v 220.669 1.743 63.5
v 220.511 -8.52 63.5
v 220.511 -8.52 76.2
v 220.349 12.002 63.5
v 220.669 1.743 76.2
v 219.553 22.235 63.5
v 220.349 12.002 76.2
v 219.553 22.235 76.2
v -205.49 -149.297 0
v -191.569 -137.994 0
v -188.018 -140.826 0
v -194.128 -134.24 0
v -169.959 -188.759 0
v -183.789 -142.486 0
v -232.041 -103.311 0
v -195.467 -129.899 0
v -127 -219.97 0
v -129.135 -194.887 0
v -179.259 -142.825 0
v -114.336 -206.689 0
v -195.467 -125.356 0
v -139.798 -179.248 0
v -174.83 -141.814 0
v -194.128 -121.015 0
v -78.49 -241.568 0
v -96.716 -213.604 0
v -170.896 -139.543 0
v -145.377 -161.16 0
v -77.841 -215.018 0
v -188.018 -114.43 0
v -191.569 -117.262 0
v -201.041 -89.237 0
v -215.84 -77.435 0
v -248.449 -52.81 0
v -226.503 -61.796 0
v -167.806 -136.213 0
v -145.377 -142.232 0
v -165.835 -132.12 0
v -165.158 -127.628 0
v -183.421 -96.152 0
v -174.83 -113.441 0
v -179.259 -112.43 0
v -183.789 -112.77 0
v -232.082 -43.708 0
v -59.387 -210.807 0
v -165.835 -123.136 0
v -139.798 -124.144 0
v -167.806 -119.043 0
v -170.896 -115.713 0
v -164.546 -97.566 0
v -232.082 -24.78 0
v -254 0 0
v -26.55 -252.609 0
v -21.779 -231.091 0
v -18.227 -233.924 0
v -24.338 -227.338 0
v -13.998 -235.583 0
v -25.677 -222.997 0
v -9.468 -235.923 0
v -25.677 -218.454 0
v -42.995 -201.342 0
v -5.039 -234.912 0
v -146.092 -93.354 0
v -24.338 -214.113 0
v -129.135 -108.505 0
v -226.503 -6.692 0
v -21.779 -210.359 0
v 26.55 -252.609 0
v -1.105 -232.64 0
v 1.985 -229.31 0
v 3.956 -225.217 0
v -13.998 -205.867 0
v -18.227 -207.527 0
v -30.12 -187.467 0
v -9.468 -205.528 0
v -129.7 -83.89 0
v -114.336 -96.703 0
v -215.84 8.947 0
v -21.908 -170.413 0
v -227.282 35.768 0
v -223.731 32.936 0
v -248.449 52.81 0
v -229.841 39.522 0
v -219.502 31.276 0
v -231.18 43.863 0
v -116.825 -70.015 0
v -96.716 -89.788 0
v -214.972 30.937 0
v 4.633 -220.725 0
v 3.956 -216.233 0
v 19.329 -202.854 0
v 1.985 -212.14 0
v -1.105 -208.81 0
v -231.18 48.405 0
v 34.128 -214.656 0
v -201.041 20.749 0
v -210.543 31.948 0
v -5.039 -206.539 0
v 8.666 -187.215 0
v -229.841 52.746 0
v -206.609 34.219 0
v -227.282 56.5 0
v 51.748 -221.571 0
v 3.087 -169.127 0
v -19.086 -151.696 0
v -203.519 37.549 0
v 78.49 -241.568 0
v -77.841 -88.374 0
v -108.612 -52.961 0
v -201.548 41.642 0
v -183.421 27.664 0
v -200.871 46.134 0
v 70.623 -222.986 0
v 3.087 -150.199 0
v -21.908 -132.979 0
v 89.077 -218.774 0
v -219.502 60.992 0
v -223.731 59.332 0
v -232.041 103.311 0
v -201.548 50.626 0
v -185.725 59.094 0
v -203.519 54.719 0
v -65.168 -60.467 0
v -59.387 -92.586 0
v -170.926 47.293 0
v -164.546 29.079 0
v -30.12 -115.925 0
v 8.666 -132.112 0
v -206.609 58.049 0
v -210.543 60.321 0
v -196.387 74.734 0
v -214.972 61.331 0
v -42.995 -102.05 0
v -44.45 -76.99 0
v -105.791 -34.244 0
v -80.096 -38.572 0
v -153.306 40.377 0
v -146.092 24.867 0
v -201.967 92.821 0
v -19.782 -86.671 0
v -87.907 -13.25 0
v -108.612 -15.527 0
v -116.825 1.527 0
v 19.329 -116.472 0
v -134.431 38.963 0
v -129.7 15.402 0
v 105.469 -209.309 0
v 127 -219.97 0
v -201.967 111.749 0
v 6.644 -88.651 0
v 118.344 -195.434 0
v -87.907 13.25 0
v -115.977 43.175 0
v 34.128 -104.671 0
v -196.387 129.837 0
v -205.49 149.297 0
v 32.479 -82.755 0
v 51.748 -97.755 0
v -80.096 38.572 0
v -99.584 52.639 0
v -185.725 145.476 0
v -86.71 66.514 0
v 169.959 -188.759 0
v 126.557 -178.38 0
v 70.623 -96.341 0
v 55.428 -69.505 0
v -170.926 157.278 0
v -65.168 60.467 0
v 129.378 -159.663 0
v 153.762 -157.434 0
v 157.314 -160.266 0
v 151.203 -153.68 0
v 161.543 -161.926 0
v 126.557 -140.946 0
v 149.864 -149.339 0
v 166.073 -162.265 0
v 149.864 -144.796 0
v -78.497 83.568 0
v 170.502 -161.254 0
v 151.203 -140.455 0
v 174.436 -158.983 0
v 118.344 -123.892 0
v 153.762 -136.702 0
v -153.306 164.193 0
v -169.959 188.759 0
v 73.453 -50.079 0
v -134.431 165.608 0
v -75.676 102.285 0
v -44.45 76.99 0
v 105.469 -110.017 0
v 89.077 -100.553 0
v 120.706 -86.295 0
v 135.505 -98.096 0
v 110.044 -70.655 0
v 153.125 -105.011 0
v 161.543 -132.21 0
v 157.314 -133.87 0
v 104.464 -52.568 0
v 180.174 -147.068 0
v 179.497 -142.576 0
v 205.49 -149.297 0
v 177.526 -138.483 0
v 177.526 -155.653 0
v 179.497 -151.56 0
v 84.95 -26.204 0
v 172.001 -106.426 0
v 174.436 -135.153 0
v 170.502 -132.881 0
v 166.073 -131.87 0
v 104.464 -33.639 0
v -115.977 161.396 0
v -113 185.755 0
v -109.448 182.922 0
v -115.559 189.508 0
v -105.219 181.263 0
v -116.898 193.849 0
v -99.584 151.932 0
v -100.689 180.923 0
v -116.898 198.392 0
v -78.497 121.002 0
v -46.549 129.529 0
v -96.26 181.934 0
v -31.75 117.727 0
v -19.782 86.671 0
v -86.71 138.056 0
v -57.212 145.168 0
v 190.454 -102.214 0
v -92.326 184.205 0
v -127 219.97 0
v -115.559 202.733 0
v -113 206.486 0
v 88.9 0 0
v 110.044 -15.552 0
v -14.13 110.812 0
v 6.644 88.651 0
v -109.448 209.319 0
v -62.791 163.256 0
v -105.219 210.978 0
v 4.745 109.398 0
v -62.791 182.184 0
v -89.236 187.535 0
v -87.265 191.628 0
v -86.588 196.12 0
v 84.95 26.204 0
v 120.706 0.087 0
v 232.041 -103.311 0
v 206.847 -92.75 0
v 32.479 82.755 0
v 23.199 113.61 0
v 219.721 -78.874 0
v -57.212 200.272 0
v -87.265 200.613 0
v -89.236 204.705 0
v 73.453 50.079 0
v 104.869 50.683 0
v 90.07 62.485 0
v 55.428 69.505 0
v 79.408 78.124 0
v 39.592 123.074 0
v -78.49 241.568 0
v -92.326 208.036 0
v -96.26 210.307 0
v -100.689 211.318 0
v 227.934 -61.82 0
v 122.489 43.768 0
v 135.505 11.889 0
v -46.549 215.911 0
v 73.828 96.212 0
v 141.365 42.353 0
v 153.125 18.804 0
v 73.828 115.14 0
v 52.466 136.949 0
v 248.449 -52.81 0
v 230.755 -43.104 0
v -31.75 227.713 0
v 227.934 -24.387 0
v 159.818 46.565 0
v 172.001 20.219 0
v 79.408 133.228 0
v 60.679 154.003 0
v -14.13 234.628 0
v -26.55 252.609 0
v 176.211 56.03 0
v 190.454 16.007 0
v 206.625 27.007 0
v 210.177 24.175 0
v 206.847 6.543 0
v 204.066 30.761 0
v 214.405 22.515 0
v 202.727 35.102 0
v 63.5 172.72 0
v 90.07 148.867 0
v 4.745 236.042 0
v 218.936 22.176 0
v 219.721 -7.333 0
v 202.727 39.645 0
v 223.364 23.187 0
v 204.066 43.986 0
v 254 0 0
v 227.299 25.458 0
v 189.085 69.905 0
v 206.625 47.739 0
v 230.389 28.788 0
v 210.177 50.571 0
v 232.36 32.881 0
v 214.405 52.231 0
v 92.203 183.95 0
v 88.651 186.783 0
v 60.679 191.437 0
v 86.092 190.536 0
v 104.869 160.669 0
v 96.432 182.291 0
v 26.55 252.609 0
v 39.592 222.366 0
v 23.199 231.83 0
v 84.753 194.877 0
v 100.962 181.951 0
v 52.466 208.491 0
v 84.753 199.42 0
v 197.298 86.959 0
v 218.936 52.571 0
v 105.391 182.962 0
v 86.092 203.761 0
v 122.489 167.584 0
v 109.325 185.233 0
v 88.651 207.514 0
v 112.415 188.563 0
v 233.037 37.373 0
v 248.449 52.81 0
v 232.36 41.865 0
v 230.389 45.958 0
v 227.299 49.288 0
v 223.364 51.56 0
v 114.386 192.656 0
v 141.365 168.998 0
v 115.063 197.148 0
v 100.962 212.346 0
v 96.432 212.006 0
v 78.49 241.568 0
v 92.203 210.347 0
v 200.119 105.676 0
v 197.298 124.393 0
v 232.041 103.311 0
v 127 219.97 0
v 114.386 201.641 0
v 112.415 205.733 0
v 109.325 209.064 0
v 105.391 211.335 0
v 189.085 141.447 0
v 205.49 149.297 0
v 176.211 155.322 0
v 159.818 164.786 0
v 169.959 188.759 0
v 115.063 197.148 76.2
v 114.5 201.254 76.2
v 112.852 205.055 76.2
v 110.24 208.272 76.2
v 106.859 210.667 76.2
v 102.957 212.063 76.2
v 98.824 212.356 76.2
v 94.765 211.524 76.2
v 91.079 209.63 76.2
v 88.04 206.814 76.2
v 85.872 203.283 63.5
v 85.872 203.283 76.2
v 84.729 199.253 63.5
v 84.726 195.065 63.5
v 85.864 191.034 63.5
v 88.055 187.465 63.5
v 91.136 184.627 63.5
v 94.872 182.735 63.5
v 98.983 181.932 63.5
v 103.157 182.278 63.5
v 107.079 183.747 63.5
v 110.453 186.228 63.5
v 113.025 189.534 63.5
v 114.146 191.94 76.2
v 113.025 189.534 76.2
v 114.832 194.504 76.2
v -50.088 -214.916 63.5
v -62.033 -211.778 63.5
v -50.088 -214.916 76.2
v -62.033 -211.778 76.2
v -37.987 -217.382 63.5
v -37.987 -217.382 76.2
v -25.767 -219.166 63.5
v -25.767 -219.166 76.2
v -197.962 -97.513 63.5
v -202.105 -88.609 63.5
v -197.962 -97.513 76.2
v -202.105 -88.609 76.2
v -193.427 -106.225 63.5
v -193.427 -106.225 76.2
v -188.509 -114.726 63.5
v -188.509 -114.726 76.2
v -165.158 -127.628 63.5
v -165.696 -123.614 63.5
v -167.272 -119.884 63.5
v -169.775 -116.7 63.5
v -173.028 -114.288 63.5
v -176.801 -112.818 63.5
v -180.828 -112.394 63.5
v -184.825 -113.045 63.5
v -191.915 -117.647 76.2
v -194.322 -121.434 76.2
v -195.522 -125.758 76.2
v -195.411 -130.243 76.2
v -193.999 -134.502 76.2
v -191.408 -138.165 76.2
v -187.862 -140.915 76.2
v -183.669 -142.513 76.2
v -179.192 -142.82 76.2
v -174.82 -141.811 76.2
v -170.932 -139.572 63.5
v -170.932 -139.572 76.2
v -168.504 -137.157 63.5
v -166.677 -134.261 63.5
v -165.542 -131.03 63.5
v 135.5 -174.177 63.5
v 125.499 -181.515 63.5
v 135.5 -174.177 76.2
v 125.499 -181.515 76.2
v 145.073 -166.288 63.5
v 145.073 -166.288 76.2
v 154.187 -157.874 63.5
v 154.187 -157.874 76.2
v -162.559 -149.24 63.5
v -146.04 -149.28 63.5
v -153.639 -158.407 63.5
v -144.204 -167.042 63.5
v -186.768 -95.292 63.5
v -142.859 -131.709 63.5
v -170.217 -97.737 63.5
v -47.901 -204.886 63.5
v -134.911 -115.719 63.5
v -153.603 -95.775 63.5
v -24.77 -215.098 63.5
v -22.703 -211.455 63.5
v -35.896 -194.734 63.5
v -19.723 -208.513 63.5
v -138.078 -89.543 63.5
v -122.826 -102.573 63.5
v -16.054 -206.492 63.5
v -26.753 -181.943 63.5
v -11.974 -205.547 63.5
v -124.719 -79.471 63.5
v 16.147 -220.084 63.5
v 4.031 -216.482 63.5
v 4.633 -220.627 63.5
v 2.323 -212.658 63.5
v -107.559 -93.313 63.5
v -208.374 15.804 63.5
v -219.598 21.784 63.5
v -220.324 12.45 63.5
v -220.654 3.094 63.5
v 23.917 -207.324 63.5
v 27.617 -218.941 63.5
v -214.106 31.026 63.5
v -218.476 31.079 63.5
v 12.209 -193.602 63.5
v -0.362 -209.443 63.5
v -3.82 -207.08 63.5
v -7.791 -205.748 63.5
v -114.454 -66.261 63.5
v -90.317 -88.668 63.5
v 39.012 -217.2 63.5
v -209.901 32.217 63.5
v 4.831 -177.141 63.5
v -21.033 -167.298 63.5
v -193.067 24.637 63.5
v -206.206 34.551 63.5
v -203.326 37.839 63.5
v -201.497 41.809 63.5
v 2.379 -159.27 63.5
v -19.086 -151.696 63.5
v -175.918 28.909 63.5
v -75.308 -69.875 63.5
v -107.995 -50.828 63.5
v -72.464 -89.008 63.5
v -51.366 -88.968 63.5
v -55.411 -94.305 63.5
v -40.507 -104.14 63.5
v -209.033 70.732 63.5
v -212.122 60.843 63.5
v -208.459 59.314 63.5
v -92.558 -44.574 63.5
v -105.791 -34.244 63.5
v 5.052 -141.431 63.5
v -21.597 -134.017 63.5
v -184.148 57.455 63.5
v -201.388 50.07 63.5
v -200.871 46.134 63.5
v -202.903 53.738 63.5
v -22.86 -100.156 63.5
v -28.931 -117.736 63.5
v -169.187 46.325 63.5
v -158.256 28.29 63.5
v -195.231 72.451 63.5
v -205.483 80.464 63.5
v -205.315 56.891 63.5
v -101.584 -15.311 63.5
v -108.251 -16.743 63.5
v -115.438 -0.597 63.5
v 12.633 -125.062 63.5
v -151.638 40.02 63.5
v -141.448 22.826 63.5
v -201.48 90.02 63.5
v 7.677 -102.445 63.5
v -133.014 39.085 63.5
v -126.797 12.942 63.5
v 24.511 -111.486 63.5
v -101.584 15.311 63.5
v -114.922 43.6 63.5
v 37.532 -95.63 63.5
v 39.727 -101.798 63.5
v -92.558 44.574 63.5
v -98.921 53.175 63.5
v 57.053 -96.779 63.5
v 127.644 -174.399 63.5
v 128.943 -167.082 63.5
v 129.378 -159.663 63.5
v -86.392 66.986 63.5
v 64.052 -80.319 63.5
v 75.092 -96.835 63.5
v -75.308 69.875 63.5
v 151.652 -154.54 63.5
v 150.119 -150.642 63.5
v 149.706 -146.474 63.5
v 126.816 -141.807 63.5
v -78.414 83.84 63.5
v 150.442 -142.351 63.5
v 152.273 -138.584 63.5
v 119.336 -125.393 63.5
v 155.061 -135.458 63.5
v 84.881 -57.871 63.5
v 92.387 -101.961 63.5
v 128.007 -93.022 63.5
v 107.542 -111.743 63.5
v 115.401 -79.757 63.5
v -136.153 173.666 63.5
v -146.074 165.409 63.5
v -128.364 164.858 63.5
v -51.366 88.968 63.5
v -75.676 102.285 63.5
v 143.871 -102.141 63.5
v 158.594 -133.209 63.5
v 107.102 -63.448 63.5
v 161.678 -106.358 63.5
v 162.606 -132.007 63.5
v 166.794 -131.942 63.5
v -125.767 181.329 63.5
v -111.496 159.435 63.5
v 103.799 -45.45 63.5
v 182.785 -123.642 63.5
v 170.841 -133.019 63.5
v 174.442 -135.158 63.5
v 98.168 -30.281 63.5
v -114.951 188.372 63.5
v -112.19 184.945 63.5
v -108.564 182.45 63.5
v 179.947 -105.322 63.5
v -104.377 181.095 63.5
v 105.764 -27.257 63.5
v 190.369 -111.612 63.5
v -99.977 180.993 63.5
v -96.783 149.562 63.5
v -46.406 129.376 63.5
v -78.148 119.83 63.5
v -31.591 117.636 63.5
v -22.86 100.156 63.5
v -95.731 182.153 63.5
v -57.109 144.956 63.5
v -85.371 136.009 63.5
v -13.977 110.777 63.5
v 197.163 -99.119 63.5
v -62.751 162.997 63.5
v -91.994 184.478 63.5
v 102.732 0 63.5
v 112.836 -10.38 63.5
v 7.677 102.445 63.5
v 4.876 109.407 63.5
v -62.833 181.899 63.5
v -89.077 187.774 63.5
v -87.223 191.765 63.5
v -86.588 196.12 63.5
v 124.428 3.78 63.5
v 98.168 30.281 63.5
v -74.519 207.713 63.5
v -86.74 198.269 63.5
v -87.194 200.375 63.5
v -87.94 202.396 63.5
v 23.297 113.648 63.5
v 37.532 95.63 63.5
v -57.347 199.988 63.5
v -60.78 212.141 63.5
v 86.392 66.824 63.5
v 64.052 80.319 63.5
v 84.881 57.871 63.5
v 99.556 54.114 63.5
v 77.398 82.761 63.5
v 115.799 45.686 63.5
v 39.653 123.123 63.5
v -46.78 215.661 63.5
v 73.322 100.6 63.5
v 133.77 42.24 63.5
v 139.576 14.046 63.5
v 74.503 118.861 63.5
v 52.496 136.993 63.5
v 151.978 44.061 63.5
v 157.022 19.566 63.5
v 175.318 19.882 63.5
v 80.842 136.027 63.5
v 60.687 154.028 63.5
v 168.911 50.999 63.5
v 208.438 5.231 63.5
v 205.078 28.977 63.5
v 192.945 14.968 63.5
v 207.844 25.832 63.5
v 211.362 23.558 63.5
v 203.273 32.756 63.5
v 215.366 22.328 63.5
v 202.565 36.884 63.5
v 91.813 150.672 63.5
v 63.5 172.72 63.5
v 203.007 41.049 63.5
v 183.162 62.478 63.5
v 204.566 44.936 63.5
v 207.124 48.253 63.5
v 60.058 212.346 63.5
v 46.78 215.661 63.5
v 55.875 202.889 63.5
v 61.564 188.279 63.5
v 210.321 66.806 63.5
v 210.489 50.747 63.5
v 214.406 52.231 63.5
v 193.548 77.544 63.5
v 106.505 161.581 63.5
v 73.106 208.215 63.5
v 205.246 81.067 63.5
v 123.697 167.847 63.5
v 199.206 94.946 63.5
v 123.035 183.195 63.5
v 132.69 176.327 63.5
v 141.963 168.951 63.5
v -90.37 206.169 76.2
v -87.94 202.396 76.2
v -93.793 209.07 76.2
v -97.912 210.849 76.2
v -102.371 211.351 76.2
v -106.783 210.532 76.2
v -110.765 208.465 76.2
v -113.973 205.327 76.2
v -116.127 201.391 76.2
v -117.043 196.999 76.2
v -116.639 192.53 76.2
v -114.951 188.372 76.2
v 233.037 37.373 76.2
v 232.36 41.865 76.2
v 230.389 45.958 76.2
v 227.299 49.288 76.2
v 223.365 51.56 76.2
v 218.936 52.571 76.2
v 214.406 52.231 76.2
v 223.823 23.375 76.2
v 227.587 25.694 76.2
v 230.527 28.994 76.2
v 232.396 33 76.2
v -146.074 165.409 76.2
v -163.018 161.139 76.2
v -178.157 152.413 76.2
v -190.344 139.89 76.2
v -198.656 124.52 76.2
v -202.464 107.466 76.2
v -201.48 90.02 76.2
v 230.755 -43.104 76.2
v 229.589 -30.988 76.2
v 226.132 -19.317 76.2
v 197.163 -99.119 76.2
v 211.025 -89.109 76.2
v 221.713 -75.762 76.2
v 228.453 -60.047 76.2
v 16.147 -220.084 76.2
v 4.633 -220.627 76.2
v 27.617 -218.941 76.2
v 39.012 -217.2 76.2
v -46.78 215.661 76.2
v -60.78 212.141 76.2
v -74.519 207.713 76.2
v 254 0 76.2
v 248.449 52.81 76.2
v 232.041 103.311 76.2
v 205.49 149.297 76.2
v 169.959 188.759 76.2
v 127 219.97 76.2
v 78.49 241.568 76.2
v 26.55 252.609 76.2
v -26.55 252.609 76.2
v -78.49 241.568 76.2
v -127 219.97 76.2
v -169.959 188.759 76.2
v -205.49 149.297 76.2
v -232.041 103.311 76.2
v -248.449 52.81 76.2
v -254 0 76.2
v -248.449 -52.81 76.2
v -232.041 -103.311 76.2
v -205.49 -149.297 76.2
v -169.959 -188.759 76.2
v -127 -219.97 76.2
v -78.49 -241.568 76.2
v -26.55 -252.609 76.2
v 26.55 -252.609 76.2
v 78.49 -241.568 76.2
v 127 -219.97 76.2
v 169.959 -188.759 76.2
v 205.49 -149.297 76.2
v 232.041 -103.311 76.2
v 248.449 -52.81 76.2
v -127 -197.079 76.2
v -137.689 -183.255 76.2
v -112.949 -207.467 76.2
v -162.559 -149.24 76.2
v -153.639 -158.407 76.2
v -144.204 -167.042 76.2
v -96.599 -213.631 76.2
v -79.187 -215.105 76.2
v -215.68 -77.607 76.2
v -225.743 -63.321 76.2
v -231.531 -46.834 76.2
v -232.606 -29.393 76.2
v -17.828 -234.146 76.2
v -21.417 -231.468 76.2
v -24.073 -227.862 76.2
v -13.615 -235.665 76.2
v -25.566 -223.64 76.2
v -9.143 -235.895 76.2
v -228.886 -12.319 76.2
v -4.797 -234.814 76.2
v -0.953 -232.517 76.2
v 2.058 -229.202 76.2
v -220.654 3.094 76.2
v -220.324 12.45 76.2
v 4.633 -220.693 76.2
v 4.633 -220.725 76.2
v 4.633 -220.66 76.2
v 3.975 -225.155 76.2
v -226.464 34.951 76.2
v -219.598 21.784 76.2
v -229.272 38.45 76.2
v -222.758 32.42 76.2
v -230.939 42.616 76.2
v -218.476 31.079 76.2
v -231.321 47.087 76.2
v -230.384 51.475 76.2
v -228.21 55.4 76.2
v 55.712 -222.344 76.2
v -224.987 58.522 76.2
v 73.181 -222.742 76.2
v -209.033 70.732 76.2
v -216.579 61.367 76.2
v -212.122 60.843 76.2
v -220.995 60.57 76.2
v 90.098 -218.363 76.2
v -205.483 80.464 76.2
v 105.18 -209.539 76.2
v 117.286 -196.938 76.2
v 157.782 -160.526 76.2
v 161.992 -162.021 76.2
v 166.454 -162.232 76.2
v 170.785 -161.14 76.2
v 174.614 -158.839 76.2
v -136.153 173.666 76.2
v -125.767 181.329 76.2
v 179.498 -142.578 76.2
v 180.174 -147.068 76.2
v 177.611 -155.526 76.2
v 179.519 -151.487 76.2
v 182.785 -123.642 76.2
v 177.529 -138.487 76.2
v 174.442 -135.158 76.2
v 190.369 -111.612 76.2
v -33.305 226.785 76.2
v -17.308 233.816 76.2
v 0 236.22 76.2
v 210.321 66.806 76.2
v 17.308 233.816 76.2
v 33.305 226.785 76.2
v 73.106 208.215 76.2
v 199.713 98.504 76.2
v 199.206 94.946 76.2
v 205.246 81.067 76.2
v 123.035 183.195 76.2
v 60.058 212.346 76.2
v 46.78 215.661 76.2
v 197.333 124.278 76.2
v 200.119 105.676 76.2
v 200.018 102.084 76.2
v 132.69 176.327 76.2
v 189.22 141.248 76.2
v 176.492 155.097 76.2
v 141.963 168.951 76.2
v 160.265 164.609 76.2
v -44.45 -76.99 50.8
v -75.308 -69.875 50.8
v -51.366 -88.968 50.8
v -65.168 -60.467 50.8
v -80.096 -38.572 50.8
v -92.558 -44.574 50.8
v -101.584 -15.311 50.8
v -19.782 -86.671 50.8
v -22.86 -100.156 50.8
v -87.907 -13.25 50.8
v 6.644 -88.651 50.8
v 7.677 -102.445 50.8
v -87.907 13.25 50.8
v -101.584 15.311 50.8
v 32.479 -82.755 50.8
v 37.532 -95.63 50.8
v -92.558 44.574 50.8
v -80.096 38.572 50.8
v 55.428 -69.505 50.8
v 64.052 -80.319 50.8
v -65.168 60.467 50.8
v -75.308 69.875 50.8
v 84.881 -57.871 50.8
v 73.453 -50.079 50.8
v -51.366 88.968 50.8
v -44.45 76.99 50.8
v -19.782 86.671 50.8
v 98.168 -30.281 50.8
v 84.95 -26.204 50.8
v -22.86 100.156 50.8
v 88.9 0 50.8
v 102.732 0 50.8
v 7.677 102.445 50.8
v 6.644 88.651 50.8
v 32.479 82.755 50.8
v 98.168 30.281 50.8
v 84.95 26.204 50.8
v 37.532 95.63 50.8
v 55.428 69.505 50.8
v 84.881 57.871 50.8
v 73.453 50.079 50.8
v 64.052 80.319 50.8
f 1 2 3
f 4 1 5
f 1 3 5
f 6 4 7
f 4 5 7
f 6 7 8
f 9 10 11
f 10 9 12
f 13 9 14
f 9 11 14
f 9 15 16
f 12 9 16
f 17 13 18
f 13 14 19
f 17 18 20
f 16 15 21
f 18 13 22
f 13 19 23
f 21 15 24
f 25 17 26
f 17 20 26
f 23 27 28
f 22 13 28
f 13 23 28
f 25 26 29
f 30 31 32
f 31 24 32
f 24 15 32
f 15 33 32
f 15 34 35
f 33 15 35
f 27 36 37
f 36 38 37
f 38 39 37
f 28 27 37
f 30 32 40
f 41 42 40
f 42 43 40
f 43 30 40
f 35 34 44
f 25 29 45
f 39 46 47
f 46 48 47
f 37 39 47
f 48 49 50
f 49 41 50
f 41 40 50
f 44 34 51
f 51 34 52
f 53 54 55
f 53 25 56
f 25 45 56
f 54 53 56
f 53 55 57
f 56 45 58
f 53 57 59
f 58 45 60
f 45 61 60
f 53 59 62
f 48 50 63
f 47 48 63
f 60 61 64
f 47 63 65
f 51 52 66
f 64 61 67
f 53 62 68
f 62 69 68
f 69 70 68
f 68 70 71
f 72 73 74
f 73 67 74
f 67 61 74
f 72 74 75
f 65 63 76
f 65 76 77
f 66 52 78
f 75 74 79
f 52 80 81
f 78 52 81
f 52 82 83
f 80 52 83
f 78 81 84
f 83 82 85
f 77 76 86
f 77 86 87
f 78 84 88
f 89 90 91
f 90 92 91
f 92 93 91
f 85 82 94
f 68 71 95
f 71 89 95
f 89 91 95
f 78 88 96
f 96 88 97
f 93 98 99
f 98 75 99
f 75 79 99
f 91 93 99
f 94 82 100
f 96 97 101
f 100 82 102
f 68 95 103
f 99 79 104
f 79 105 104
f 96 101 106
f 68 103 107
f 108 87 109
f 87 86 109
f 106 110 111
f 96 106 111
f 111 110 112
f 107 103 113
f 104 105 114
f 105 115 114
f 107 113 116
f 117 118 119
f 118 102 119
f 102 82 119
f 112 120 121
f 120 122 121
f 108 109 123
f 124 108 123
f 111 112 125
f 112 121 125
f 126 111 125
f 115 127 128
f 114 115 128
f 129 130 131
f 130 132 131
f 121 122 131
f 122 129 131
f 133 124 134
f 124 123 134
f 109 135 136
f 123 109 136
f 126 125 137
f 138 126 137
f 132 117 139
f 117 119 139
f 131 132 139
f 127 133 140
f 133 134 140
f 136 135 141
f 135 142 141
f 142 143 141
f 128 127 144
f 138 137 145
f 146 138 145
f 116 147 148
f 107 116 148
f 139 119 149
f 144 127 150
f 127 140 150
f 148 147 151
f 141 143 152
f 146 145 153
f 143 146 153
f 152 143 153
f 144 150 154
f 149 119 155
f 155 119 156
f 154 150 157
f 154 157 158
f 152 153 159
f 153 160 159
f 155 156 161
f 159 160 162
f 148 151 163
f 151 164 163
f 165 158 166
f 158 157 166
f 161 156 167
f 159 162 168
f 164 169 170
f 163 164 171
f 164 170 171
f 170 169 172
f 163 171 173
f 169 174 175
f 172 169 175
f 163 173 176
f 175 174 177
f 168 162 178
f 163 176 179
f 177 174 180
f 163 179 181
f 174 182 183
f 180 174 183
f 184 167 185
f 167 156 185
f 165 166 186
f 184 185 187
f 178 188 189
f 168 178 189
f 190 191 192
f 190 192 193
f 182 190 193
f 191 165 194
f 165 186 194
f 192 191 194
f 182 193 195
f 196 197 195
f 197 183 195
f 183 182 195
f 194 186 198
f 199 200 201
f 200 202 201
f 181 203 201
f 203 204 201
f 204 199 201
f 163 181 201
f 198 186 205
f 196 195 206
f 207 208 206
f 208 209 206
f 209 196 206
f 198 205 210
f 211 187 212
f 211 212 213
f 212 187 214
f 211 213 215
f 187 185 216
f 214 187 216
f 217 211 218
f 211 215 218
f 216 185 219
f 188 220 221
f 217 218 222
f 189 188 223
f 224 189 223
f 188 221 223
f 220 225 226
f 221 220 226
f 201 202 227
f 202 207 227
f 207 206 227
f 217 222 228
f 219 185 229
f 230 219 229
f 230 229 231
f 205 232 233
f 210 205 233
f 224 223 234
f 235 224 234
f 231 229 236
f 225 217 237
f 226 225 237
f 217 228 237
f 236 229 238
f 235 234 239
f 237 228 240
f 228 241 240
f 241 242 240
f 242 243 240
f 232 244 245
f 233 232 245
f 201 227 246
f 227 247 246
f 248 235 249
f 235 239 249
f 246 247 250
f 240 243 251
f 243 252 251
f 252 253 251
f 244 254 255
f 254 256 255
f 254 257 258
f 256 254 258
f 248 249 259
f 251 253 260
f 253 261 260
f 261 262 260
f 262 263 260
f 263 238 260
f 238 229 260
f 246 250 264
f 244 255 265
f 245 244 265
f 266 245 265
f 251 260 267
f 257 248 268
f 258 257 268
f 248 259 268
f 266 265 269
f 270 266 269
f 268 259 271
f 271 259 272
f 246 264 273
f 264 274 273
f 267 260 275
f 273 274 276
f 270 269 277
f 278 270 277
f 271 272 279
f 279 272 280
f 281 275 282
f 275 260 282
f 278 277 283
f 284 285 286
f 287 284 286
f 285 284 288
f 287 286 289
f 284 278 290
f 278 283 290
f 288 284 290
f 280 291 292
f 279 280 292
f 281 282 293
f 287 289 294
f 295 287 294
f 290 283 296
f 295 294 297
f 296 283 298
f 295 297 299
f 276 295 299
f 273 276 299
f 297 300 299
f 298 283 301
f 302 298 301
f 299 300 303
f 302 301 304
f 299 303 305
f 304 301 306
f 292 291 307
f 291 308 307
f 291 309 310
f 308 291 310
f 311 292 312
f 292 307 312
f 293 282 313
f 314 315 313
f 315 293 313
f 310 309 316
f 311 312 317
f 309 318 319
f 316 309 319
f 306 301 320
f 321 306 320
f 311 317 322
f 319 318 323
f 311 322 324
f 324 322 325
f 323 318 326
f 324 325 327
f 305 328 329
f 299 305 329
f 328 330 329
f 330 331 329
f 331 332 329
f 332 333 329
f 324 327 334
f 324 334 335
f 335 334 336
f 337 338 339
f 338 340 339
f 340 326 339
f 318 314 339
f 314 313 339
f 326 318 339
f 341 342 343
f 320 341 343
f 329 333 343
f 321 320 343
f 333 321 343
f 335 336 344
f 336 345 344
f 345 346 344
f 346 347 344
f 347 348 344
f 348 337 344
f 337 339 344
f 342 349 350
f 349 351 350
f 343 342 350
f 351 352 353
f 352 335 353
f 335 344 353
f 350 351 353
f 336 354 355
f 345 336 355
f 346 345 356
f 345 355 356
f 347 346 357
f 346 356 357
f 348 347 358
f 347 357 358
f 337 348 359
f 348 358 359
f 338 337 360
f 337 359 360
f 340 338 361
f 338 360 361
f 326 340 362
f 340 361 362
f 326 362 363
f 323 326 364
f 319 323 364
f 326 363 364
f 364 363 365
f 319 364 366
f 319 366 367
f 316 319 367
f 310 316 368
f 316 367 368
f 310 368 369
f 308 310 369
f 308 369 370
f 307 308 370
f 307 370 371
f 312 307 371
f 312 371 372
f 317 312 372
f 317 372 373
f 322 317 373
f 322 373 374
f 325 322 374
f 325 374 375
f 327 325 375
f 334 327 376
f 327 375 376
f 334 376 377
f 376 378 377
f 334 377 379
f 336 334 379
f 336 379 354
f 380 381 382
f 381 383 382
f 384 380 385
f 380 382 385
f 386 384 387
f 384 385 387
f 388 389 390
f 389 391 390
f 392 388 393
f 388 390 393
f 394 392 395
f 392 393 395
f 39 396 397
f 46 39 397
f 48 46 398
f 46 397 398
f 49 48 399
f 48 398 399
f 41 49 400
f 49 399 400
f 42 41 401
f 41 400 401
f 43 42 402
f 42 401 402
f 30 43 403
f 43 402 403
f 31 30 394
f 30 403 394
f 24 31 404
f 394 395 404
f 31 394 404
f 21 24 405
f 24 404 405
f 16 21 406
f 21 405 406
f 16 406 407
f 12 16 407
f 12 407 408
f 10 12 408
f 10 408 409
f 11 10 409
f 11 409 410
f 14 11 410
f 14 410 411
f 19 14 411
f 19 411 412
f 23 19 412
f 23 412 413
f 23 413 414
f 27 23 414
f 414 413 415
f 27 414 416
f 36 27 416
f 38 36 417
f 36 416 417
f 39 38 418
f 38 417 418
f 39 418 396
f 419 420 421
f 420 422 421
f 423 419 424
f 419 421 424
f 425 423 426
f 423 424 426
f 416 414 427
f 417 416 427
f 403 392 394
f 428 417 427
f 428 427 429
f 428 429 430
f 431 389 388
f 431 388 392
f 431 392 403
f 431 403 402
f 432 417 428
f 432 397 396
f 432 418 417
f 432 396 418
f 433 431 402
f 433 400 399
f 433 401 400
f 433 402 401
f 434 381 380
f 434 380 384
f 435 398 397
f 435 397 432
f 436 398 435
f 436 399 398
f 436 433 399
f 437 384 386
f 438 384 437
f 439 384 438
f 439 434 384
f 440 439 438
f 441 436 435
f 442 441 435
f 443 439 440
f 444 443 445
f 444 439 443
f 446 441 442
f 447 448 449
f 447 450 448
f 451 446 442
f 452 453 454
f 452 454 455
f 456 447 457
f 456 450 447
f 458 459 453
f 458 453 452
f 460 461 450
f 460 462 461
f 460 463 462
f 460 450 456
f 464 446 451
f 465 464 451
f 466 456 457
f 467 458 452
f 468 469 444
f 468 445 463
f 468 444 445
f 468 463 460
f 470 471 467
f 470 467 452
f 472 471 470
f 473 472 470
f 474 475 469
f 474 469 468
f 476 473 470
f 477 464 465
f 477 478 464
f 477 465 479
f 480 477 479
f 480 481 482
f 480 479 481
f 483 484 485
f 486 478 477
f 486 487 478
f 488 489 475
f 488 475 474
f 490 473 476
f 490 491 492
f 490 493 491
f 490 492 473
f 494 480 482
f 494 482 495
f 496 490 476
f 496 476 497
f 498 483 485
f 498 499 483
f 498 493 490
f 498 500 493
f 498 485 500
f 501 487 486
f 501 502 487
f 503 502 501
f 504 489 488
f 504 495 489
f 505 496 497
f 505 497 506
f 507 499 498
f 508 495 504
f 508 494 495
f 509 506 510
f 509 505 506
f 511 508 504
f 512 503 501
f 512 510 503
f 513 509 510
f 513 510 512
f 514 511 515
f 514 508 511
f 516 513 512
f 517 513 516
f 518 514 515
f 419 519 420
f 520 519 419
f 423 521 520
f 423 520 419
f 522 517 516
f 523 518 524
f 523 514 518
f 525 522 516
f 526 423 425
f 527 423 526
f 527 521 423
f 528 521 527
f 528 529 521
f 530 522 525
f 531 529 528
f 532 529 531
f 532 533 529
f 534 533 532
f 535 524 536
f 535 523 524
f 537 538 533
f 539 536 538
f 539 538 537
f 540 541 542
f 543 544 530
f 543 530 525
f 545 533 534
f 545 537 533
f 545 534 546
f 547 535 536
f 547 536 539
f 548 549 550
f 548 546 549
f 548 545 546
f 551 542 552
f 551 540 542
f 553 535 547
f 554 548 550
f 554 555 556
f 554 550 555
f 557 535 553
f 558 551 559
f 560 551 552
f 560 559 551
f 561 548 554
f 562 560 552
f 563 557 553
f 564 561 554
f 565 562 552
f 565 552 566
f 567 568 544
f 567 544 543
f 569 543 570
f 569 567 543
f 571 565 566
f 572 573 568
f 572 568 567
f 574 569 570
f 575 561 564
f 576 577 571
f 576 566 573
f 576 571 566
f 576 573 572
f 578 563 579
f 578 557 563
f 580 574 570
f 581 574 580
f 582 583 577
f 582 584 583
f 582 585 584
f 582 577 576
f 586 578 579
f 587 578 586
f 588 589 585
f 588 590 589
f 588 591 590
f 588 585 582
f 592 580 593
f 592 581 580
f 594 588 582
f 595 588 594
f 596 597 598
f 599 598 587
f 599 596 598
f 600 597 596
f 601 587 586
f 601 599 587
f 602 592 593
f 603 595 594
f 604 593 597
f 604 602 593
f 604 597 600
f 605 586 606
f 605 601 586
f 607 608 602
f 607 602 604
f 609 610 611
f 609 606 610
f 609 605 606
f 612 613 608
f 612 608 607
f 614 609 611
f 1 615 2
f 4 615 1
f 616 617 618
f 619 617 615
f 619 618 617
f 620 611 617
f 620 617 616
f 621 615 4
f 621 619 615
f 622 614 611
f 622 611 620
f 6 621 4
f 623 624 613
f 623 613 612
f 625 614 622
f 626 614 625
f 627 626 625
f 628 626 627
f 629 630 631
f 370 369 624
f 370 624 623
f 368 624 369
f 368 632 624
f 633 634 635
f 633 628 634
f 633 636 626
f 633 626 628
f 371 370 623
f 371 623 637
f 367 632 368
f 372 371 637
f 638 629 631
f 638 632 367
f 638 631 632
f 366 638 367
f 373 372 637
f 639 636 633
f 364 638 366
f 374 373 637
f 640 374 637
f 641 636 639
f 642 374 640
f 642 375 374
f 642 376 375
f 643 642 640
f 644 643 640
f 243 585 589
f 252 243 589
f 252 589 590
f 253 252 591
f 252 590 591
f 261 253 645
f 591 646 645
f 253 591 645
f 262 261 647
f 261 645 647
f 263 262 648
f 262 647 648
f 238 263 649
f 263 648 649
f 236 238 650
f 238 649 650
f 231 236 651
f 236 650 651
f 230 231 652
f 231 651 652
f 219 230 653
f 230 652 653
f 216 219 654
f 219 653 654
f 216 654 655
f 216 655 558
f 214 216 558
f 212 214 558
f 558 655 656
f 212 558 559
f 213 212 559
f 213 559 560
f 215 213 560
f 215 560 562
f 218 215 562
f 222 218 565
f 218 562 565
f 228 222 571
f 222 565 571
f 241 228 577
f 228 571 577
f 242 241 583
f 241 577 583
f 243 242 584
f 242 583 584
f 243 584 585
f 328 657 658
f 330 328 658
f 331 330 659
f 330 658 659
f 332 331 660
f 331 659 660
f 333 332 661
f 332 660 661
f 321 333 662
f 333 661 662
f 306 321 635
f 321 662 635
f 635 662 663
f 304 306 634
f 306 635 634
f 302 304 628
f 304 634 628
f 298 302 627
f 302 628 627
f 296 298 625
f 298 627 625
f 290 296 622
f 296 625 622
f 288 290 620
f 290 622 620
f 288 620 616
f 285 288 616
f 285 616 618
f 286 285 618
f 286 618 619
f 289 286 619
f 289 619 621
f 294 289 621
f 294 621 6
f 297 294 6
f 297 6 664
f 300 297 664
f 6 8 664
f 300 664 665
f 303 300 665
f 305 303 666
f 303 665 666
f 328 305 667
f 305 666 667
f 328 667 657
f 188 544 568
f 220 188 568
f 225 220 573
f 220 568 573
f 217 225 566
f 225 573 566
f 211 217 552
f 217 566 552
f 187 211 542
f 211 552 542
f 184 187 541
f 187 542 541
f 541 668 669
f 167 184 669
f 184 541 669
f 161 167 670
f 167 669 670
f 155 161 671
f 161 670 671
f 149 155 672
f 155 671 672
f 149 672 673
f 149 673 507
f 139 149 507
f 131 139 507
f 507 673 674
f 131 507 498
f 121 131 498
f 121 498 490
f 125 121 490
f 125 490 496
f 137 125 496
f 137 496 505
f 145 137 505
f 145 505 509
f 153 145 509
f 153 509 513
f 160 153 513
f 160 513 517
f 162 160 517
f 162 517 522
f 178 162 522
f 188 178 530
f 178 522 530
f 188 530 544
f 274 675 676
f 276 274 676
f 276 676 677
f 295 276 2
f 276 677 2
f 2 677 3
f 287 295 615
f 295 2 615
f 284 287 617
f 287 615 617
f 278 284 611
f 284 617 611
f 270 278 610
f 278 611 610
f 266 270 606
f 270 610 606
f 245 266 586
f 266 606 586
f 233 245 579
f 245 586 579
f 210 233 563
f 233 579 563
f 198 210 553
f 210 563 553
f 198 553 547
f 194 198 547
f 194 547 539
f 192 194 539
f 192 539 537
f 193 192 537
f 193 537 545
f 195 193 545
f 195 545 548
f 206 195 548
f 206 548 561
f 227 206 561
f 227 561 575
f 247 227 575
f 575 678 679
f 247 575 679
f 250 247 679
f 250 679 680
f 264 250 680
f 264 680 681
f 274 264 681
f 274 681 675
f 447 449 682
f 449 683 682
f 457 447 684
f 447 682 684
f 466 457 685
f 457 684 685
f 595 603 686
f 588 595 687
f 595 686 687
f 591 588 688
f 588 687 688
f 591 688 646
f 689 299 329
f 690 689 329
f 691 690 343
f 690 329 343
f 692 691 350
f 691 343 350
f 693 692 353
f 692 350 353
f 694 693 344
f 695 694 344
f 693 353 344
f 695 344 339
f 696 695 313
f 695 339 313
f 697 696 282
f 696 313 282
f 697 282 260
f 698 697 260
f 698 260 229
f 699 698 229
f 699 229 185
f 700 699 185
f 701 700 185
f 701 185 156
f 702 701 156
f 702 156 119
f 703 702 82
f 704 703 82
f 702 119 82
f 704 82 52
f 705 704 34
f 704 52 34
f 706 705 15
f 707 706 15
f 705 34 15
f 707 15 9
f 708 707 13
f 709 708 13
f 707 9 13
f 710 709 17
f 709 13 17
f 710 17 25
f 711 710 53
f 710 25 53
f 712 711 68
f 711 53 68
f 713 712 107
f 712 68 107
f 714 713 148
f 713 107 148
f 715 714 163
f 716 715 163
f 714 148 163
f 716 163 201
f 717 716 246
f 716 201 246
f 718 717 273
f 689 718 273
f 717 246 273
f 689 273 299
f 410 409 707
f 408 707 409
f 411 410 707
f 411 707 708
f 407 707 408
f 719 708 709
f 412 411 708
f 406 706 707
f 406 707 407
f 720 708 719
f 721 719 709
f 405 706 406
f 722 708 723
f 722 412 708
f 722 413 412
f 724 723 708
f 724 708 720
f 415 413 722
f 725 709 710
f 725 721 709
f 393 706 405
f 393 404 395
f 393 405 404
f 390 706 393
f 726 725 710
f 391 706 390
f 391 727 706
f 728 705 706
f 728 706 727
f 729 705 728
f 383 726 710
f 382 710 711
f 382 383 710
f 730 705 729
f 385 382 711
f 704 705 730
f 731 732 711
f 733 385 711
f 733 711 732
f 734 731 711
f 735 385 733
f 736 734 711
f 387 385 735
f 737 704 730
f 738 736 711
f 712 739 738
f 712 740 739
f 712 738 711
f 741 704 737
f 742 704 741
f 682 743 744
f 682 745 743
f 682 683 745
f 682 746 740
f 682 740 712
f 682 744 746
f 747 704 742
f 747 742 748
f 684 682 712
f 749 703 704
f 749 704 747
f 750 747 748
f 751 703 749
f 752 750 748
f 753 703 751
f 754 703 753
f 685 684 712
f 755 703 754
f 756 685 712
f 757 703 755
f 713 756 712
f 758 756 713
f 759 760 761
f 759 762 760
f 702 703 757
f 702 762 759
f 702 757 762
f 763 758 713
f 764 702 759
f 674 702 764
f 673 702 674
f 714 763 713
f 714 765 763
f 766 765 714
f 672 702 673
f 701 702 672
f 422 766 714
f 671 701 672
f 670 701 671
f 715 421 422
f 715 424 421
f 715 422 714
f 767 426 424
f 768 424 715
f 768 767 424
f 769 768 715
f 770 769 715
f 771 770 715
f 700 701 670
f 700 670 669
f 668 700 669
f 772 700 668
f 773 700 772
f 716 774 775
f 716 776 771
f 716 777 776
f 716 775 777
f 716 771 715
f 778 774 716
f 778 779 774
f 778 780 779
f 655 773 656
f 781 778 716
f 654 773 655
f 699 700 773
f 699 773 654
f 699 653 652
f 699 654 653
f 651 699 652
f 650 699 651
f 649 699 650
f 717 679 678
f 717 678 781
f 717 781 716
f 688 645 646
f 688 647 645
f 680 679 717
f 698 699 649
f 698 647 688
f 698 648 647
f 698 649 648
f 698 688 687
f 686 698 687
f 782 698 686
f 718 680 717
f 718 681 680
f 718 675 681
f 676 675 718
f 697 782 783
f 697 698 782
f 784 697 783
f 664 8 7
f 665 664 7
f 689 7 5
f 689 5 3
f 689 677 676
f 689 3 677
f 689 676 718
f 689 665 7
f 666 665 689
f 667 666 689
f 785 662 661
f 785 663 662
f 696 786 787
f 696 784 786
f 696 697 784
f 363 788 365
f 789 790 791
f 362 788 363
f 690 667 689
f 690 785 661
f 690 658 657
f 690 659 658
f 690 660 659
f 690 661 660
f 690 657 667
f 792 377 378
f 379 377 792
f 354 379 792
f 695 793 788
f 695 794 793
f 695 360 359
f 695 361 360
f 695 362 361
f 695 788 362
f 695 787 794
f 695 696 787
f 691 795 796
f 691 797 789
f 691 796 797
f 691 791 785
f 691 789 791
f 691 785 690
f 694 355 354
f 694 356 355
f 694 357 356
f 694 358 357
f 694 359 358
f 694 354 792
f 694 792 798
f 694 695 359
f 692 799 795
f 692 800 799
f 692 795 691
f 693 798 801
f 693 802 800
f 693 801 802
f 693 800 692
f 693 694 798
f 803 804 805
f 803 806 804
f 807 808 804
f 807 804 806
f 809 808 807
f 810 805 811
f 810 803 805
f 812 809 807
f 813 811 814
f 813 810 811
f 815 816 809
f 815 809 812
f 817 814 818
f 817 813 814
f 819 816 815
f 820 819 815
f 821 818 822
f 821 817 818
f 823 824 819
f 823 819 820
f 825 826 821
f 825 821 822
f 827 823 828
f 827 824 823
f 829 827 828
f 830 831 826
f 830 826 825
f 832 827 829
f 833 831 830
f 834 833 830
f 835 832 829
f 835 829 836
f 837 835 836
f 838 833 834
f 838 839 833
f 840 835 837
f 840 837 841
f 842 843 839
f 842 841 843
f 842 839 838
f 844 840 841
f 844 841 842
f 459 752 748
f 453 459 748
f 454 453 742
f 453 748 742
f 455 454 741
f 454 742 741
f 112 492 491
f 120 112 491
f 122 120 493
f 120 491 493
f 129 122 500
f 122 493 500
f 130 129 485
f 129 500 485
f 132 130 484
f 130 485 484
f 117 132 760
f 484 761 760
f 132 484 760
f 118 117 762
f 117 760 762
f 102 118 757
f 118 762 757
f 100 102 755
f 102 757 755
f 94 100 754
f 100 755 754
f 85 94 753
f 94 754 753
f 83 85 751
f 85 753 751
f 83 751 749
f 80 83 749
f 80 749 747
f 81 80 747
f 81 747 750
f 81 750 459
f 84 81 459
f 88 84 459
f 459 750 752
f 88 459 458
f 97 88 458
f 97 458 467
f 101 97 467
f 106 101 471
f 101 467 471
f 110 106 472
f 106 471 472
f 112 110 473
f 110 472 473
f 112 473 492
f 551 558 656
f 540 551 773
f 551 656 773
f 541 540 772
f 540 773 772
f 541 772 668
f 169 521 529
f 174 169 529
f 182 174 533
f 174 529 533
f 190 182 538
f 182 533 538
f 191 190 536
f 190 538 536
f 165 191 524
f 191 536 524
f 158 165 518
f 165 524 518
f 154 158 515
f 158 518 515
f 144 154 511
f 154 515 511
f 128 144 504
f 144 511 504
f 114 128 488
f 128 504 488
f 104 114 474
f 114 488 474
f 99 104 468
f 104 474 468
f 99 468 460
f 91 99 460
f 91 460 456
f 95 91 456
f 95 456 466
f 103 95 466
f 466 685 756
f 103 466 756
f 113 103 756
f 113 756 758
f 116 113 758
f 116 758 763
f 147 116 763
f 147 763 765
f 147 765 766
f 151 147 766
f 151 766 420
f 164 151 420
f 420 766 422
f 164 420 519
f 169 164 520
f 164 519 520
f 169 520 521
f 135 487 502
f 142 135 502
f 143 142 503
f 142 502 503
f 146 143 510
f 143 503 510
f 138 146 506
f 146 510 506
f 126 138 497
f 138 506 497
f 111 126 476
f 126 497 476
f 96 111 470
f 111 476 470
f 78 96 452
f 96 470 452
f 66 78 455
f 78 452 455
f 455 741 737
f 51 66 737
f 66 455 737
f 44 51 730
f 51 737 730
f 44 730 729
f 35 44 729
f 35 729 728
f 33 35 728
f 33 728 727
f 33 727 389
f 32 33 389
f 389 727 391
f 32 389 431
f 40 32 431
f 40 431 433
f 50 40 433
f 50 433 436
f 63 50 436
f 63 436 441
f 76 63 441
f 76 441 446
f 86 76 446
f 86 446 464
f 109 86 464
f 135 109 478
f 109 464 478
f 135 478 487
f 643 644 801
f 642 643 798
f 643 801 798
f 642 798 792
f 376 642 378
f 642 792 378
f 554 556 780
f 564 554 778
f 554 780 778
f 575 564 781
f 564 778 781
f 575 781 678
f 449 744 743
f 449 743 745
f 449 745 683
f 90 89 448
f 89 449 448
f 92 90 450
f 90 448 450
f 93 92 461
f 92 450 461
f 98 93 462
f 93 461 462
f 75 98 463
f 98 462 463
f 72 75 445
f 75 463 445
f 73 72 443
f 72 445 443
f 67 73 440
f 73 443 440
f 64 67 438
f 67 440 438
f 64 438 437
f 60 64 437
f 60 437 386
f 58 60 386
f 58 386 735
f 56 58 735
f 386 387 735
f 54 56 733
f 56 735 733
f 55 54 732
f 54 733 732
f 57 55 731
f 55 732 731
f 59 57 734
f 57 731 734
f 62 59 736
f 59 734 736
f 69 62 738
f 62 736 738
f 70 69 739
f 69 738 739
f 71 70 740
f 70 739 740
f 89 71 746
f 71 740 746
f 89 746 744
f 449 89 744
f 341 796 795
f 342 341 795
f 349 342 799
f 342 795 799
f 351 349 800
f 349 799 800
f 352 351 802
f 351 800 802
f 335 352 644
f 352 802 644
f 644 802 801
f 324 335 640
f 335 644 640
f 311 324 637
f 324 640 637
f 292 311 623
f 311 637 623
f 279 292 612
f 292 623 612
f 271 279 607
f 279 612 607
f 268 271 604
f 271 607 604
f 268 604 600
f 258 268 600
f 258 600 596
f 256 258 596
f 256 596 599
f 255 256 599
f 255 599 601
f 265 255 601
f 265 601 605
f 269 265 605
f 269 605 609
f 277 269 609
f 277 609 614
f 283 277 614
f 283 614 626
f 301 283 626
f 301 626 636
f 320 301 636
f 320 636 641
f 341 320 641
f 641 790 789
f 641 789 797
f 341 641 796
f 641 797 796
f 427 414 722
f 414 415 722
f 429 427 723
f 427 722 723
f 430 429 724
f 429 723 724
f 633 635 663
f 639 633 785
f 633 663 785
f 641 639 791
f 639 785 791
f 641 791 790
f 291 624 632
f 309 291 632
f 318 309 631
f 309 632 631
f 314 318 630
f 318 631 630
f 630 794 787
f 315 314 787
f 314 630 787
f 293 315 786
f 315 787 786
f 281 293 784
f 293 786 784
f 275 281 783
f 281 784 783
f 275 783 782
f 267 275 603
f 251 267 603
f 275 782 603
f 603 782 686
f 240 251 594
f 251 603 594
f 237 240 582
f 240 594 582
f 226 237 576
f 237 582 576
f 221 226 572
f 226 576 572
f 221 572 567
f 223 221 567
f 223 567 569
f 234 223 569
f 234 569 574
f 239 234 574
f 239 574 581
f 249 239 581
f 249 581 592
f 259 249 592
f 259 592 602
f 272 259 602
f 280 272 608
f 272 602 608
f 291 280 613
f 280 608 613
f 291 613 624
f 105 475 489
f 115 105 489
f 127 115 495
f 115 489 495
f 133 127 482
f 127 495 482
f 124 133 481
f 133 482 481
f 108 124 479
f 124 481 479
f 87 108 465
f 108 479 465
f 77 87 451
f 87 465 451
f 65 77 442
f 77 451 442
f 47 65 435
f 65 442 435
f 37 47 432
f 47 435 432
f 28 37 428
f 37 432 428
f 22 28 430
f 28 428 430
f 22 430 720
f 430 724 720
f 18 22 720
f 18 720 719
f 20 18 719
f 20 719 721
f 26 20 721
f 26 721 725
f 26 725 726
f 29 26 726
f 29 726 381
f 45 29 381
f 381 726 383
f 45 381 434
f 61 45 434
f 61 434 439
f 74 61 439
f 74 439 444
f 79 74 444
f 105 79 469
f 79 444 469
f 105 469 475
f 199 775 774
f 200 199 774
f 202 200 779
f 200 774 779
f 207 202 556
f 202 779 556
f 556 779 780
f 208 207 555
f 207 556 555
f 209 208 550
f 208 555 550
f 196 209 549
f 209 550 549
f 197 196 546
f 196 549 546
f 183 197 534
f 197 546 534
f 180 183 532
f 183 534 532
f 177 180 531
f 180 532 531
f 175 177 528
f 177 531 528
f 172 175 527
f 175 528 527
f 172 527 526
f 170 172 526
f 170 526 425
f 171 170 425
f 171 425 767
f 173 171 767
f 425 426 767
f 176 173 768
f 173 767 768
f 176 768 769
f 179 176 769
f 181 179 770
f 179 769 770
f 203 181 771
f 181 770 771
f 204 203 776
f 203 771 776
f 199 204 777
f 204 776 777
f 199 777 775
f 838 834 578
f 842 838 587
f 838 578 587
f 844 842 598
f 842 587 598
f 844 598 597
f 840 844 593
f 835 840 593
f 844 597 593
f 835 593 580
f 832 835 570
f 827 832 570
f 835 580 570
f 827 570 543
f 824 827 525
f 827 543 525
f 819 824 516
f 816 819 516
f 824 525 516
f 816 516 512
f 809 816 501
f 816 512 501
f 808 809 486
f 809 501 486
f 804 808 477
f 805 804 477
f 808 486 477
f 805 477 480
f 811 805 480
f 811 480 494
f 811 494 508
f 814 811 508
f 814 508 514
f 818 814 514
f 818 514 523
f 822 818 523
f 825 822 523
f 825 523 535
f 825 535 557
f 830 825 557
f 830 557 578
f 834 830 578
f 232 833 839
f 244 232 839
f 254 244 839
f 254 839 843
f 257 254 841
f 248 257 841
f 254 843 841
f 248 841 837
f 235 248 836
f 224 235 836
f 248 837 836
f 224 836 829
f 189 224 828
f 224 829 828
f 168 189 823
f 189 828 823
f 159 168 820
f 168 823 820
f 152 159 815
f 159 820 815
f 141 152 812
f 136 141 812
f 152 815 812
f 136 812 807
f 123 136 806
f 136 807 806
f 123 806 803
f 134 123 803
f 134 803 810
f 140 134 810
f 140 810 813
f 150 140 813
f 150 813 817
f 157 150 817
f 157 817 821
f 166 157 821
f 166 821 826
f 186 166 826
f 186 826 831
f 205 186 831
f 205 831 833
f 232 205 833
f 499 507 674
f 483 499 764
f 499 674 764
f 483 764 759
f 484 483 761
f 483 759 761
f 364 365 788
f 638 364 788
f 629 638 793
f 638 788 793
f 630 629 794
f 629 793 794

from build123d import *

# Parameters (mm, degrees)
F0_R      = 254
F1_DEPTH  = 76.2
F2_R      = 88.9
F3_DEPTH  = 152.4
F4_R      = 63.5
F5_DEPTH  = 152.4
F7_R      = 102.731788
F8_DEPTH  = 25.4
F9_R      = 220.675827
F10_DEPTH = 12.7
F6_R      = 15.24
F11_DEPTH = 152.4


with BuildPart() as f1:
    # F0 (on Top) → F1 (new body)
    with BuildSketch(Plane.XY):
        Circle(F0_R)
    extrude(amount=F1_DEPTH)

    # F2 (on face) → F3 (cut)
    with BuildSketch(Plane.XY.offset(76.2)):
        Circle(F2_R)
    extrude(amount=-F3_DEPTH, mode=Mode.SUBTRACT)

    # F4 (on face) → F5 (cut)
    with BuildSketch(Plane.XY.offset(76.2)):
        with Locations((0, 172.72)):
            Circle(F4_R)
        with Locations((136.619191, 105.675896)):
            Circle(F4_R)
        with Locations((167.255145, -43.103538)):
            Circle(F4_R)
        with Locations((-82.586414, -151.69602)):
            Circle(F4_R)
        with Locations((-169.291327, -34.243903)):
            Circle(F4_R)
        with Locations((-139.175909, 102.285213)):
            Circle(F4_R)
        with Locations((65.877814, -159.66312)):
            Circle(F4_R)
    extrude(amount=-F5_DEPTH, mode=Mode.SUBTRACT)

    # F7 (on face) → F8 (cut)
    with BuildSketch(Plane.XY.offset(76.2)):
        Circle(F7_R)
    extrude(amount=-F8_DEPTH, mode=Mode.SUBTRACT)

    # F9 (on face) → F10 (cut)
    with BuildSketch(Plane.XY.offset(76.2)):
        Circle(F9_R)
    extrude(amount=-F10_DEPTH, mode=Mode.SUBTRACT)

    # F6 (on face) → F11 (cut)
    with BuildSketch(Plane.XY.offset(76.2)):
        with Locations((-101.82795, 196.120445)):
            Circle(F6_R)
        with Locations((99.8231, 197.148444)):
            Circle(F6_R)
        with Locations((217.796701, 37.373219)):
            Circle(F6_R)
        with Locations((164.933983, -147.067813)):
            Circle(F6_R)
        with Locations((-180.397614, -127.627823)):
            Circle(F6_R)
        with Locations((-216.110642, 46.134055)):
            Circle(F6_R)
        with Locations((-10.606943, -220.725289)):
            Circle(F6_R)
    extrude(amount=-F11_DEPTH, mode=Mode.SUBTRACT)


solid = f1.part
